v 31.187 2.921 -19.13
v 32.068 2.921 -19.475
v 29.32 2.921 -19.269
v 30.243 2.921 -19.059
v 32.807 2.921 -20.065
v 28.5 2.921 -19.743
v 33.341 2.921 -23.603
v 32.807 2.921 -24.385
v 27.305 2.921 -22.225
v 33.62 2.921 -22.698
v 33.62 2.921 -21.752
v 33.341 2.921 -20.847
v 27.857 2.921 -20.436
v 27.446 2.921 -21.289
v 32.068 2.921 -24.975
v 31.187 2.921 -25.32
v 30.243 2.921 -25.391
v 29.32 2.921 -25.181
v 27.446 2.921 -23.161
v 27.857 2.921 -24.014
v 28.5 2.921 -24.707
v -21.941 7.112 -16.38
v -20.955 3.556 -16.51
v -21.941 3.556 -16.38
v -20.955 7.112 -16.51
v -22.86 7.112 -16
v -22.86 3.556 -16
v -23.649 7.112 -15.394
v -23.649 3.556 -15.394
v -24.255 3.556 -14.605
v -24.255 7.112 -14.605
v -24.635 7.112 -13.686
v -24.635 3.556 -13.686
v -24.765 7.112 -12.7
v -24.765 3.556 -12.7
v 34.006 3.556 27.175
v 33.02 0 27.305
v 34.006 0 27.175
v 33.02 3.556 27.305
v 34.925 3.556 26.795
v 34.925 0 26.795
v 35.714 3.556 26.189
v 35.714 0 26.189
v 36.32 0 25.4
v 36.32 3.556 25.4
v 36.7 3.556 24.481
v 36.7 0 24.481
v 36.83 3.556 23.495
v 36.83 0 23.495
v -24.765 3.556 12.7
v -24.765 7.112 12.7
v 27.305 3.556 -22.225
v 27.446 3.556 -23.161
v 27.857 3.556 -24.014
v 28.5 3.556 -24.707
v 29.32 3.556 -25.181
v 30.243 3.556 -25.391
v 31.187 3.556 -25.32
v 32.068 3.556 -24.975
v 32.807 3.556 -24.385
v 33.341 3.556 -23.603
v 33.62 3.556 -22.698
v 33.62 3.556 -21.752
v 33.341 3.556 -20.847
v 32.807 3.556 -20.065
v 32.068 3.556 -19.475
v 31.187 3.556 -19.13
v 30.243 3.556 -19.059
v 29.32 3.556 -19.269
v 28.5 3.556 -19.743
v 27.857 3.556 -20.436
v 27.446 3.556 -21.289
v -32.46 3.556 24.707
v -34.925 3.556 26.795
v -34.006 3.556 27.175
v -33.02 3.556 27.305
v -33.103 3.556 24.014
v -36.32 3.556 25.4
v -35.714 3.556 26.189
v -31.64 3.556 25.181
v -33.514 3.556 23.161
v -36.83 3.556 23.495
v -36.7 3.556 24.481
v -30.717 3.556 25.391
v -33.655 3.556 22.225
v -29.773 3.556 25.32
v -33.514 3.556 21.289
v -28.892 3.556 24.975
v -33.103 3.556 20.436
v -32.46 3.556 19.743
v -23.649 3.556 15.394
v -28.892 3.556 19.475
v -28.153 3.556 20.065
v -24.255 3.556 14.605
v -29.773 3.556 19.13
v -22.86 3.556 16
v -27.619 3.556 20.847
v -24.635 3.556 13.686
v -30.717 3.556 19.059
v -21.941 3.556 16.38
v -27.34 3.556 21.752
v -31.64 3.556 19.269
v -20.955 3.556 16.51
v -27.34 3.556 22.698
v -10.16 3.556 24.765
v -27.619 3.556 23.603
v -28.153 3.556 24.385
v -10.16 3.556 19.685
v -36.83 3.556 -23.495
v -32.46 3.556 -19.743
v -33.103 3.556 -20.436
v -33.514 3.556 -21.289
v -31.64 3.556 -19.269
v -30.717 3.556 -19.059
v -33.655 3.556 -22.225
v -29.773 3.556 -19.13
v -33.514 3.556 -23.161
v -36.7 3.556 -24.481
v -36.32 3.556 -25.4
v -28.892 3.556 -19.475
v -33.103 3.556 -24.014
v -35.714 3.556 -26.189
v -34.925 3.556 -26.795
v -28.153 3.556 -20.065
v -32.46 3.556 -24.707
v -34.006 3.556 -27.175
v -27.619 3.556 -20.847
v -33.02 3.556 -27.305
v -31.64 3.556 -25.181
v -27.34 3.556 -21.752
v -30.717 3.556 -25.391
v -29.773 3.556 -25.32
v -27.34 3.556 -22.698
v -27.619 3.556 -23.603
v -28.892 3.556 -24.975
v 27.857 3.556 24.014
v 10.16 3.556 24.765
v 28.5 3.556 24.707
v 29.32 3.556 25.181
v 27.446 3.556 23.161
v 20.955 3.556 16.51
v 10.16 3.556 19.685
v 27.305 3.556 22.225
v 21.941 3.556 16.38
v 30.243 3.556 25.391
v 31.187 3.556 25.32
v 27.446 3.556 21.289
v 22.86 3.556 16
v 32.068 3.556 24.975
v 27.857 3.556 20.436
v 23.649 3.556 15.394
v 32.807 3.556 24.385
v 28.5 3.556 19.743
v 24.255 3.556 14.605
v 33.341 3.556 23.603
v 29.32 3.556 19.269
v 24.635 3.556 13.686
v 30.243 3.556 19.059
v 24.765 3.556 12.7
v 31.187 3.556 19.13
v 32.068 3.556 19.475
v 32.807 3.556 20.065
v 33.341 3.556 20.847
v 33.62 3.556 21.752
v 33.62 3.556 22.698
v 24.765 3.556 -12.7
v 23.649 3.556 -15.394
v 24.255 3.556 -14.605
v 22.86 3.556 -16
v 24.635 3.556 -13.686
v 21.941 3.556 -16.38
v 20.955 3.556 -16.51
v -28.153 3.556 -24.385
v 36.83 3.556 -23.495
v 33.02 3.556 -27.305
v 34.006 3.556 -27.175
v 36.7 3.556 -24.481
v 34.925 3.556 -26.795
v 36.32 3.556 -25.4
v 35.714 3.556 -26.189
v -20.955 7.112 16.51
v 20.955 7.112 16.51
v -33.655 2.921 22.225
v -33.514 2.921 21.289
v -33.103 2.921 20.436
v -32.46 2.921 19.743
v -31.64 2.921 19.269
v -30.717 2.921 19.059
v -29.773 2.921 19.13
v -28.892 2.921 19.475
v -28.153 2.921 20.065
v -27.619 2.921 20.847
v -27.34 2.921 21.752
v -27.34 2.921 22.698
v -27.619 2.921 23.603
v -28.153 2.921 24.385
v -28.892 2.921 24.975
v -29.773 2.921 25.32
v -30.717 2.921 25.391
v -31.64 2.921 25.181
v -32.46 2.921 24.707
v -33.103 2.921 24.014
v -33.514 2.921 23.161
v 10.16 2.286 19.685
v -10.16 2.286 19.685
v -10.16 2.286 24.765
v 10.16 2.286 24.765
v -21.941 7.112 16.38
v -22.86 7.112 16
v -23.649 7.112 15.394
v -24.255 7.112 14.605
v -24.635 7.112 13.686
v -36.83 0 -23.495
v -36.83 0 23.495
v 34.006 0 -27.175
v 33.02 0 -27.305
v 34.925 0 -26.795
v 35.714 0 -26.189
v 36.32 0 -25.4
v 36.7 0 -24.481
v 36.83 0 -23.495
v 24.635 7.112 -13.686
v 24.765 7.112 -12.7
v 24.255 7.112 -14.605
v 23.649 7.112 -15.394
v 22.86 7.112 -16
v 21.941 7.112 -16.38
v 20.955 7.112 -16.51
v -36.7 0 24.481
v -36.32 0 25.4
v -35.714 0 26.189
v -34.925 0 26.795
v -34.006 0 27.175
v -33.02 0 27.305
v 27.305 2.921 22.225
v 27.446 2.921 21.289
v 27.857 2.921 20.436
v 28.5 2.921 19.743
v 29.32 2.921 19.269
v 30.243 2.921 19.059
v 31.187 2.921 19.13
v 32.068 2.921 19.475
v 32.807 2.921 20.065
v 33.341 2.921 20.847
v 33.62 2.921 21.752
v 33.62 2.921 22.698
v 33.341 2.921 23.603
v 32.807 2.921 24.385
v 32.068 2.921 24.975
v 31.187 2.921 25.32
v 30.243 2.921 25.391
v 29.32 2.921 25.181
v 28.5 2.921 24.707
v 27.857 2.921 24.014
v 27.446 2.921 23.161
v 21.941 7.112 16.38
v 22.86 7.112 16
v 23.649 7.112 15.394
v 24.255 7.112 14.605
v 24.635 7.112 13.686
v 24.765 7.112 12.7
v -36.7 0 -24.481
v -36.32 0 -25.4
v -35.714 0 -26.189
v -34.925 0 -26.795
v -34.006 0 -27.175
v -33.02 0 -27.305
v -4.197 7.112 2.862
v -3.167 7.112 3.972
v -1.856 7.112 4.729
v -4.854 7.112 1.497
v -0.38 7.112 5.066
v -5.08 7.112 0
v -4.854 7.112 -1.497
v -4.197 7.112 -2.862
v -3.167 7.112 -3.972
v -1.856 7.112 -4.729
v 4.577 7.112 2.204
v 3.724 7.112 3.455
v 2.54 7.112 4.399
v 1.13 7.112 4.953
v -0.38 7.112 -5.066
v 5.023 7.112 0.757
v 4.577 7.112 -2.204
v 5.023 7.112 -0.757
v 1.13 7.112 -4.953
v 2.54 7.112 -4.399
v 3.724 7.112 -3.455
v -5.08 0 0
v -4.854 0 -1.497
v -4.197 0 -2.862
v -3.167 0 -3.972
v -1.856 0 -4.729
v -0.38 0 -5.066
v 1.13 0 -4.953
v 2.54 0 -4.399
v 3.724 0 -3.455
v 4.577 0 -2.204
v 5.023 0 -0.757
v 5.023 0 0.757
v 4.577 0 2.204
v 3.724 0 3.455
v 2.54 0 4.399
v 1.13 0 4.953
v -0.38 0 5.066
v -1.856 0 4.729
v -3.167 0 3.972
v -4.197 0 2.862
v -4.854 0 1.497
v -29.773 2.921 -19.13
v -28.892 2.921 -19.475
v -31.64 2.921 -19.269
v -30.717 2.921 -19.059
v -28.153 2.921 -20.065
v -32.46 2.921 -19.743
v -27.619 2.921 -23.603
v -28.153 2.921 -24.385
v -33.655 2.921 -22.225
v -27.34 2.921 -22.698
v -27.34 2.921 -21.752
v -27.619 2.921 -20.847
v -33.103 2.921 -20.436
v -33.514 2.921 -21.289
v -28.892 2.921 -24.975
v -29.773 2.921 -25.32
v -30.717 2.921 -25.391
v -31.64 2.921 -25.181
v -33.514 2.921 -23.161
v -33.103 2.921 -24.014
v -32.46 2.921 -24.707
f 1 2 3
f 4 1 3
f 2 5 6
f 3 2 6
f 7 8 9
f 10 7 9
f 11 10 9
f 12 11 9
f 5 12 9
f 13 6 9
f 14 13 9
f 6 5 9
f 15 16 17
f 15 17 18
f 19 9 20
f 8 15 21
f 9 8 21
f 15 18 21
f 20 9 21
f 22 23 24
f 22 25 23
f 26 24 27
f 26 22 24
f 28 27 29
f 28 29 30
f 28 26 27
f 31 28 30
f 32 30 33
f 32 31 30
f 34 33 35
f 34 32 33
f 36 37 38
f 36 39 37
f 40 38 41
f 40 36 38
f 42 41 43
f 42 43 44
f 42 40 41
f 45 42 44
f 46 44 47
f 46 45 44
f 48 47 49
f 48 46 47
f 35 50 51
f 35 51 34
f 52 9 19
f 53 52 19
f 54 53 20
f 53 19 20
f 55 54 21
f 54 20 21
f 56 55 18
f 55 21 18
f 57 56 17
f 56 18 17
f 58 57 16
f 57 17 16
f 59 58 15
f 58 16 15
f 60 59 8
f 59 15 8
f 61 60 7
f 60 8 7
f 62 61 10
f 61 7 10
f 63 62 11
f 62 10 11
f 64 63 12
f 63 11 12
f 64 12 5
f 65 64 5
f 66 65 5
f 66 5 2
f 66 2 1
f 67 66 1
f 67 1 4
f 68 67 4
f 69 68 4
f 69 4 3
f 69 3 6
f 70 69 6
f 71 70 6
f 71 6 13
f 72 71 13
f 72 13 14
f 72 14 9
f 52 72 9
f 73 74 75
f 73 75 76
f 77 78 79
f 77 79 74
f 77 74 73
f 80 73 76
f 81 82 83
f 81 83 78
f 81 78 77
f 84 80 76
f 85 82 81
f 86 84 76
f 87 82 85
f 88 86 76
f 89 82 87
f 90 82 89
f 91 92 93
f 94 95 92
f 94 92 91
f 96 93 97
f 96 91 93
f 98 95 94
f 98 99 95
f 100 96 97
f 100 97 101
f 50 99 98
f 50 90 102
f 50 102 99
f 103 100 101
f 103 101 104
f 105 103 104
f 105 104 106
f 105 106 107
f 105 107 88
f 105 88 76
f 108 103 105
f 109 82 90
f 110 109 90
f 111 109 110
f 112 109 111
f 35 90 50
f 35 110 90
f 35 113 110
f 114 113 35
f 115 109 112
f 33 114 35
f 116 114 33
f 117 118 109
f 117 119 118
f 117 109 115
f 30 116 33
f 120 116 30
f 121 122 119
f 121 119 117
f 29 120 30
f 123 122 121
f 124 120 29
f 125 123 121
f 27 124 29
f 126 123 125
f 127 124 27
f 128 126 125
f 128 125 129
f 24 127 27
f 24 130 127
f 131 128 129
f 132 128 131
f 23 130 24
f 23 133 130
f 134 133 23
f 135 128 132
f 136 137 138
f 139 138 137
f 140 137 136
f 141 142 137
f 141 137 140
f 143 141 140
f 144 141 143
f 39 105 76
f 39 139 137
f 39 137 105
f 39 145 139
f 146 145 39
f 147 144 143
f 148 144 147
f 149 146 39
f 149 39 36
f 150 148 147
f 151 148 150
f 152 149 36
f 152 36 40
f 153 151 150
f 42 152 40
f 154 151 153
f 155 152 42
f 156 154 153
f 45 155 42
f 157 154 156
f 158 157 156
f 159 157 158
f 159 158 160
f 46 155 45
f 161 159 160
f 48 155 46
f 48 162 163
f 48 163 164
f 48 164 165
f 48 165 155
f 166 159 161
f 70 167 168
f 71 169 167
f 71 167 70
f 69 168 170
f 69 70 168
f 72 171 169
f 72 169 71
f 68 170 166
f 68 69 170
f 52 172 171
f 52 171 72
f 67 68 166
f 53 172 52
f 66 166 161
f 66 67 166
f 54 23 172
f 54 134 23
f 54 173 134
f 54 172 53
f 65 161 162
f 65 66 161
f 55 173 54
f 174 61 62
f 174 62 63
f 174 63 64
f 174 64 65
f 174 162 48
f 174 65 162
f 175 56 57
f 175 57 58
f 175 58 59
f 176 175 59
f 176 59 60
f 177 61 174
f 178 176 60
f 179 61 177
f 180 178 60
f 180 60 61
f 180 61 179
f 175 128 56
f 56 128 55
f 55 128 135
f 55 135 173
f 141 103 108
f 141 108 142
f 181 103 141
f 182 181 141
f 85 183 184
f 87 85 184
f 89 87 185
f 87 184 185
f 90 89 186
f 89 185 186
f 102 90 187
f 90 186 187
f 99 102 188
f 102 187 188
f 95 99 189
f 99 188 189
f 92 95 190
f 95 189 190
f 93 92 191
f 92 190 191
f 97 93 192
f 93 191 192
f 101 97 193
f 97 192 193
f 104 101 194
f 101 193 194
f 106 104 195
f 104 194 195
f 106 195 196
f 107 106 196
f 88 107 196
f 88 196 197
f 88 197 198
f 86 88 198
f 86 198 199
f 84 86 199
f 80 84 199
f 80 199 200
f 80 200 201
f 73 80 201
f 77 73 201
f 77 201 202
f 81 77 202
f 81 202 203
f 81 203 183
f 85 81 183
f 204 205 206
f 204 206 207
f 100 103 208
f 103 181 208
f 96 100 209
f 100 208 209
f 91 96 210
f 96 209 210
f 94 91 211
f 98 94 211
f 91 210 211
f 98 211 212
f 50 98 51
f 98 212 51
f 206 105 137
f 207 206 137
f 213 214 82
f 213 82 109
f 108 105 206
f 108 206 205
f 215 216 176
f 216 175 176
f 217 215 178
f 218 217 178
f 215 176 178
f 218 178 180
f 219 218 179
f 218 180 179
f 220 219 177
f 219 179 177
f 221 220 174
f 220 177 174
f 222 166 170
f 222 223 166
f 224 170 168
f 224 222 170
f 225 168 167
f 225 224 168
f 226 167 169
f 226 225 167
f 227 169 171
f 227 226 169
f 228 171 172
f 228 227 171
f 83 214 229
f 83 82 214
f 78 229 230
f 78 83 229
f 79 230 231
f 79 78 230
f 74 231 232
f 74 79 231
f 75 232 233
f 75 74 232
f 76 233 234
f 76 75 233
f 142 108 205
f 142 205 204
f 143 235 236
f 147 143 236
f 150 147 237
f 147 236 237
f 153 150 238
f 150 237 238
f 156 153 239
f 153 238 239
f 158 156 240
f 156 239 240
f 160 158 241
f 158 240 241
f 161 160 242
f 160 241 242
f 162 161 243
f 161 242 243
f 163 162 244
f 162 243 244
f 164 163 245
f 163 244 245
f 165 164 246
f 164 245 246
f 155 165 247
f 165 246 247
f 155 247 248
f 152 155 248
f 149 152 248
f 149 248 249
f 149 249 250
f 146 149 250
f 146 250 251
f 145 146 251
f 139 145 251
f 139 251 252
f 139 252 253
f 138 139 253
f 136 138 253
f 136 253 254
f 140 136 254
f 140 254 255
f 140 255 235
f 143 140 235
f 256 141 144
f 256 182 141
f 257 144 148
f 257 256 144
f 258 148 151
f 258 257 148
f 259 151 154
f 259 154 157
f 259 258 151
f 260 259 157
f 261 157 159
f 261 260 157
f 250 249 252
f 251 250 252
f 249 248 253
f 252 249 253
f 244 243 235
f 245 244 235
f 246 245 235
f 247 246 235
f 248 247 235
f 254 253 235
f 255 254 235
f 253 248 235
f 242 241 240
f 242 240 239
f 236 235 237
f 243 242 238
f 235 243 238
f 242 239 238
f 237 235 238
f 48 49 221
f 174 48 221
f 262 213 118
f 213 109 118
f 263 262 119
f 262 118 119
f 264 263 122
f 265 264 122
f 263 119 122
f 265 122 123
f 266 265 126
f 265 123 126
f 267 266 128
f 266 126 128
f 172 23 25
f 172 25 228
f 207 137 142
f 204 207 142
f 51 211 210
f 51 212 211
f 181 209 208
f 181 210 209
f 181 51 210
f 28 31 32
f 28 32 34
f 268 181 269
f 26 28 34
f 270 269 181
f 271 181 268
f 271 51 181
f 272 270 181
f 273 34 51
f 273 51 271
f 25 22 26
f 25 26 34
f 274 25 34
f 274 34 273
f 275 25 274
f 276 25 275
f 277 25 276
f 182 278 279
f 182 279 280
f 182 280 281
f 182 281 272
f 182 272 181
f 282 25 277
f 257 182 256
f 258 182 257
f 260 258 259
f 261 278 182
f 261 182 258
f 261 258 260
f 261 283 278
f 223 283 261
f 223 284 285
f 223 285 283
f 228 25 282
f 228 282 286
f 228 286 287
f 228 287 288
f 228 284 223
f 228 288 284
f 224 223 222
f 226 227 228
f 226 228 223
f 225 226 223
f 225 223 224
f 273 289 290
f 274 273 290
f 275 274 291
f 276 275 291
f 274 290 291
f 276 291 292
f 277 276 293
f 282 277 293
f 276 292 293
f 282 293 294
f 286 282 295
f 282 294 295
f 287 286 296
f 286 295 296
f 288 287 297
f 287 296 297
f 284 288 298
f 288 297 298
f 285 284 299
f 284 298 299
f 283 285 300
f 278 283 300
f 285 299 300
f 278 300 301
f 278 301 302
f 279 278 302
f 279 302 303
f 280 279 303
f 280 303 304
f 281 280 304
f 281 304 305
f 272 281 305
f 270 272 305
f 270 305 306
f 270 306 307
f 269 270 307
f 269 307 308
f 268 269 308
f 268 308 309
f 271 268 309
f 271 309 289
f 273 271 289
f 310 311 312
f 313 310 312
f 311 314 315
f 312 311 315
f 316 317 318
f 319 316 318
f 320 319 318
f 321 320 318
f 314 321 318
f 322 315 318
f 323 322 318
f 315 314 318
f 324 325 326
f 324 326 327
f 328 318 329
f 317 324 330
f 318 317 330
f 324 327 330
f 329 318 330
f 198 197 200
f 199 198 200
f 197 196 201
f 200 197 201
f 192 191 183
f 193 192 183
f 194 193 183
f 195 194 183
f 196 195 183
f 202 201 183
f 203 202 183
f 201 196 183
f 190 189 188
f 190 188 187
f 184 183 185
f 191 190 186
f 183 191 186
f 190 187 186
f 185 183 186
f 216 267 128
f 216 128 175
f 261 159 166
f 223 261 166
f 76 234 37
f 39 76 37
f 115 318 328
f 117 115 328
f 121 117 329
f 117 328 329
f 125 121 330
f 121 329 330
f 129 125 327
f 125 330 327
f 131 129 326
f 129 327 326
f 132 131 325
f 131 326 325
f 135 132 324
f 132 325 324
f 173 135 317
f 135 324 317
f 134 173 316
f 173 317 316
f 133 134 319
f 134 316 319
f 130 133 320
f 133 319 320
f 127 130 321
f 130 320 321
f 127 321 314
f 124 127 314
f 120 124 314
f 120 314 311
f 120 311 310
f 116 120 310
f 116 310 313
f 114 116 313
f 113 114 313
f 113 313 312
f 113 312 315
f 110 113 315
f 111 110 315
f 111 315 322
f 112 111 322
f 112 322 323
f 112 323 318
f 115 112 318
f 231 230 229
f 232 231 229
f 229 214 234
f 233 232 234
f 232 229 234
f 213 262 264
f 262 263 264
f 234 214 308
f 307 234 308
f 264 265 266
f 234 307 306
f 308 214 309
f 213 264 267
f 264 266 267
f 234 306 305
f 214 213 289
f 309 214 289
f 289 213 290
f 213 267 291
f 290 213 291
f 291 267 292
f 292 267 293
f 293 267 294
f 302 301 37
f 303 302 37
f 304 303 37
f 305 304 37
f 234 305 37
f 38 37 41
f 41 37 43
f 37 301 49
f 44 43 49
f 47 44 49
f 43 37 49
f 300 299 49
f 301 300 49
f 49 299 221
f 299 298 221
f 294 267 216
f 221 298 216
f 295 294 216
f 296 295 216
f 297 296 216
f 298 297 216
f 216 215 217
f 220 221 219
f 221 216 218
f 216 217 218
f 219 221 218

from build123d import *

# Parameters (mm, degrees)
SKETCH3_W                      = 73.66
SKETCH3_H                      = 54.61
EXTRUDED_LOWER_PLATE_DEPTH     = 3.556
SKETCH4_W                      = 49.53
SKETCH4_H                      = 33.02
EXTRUDED_UPPER_PLATE_DEPTH     = 3.556
PLATE_CORNER_FILLET_R          = 3.81
F_0_4D_HOLE_D                  = 10.16
SKETCH9_W                      = 20.32
SKETCH9_H                      = 5.08
EXTRUDED_RECTANGULAR_CUT_DEPTH = 1.27
F_4X_0_25D_PINS_D              = 6.35
F_4X_0_25D_PINS_DEPTH          = 0.635


with BuildPart() as part:
    # Sketch3 → Extruded Lower Plate (new body)
    with BuildSketch(Plane(origin=(0, 0, 0), x_dir=(1, 0, 0), z_dir=(0, 1, 0))):
        Rectangle(SKETCH3_W, SKETCH3_H)
    extrude(amount=EXTRUDED_LOWER_PLATE_DEPTH)

    # Sketch4 → Extruded Upper Plate (add)
    with BuildSketch(Plane(origin=(0, 3.556, 0), x_dir=(1, 0, 0), z_dir=(0, 1, 0))):
        Rectangle(SKETCH4_W, SKETCH4_H)
    extrude(amount=EXTRUDED_UPPER_PLATE_DEPTH)

    # Plate Corner Fillet
    plate_corner_fillet_edges = [part.edges().sort_by_distance(p)[0] for p in [
        (24.765, 5.334, -16.51),
        (-24.765, 5.334, -16.51),
        (-24.765, 5.334, 16.51),
        (24.765, 5.334, 16.51),
        (-36.83, 1.778, -27.305),
        (36.83, 1.778, -27.305),
        (36.83, 1.778, 27.305),
        (-36.83, 1.778, 27.305),
    ]]
    fillet(plate_corner_fillet_edges, radius=PLATE_CORNER_FILLET_R)

    # 0.4D Hole (through all)
    with Locations(Plane(origin=(0, 7.112, 0), x_dir=(1, 0, 0), z_dir=(0, 1, 0))):
        with Locations((0, 0)):
            Hole(F_0_4D_HOLE_D / 2)

    # Sketch9 → Extruded Rectangular Cut (cut)
    with BuildSketch(Plane(origin=(0, 3.556, 0), x_dir=(1, 0, 0), z_dir=(0, 1, 0))):
        with Locations((0, -22.225)):
            Rectangle(SKETCH9_W, SKETCH9_H)
    extrude(amount=-EXTRUDED_RECTANGULAR_CUT_DEPTH, mode=Mode.SUBTRACT)

    # 4X 0.25D Pins
    with Locations(Plane(origin=(0, 3.556, 0), x_dir=(1, 0, 0), z_dir=(0, 1, 0))):
        with Locations((-30.48, -22.225), (-30.48, 22.225), (30.48, 22.225), (30.48, -22.225)):
            Hole(F_4X_0_25D_PINS_D / 2, depth=F_4X_0_25D_PINS_DEPTH)


solid = part.part
